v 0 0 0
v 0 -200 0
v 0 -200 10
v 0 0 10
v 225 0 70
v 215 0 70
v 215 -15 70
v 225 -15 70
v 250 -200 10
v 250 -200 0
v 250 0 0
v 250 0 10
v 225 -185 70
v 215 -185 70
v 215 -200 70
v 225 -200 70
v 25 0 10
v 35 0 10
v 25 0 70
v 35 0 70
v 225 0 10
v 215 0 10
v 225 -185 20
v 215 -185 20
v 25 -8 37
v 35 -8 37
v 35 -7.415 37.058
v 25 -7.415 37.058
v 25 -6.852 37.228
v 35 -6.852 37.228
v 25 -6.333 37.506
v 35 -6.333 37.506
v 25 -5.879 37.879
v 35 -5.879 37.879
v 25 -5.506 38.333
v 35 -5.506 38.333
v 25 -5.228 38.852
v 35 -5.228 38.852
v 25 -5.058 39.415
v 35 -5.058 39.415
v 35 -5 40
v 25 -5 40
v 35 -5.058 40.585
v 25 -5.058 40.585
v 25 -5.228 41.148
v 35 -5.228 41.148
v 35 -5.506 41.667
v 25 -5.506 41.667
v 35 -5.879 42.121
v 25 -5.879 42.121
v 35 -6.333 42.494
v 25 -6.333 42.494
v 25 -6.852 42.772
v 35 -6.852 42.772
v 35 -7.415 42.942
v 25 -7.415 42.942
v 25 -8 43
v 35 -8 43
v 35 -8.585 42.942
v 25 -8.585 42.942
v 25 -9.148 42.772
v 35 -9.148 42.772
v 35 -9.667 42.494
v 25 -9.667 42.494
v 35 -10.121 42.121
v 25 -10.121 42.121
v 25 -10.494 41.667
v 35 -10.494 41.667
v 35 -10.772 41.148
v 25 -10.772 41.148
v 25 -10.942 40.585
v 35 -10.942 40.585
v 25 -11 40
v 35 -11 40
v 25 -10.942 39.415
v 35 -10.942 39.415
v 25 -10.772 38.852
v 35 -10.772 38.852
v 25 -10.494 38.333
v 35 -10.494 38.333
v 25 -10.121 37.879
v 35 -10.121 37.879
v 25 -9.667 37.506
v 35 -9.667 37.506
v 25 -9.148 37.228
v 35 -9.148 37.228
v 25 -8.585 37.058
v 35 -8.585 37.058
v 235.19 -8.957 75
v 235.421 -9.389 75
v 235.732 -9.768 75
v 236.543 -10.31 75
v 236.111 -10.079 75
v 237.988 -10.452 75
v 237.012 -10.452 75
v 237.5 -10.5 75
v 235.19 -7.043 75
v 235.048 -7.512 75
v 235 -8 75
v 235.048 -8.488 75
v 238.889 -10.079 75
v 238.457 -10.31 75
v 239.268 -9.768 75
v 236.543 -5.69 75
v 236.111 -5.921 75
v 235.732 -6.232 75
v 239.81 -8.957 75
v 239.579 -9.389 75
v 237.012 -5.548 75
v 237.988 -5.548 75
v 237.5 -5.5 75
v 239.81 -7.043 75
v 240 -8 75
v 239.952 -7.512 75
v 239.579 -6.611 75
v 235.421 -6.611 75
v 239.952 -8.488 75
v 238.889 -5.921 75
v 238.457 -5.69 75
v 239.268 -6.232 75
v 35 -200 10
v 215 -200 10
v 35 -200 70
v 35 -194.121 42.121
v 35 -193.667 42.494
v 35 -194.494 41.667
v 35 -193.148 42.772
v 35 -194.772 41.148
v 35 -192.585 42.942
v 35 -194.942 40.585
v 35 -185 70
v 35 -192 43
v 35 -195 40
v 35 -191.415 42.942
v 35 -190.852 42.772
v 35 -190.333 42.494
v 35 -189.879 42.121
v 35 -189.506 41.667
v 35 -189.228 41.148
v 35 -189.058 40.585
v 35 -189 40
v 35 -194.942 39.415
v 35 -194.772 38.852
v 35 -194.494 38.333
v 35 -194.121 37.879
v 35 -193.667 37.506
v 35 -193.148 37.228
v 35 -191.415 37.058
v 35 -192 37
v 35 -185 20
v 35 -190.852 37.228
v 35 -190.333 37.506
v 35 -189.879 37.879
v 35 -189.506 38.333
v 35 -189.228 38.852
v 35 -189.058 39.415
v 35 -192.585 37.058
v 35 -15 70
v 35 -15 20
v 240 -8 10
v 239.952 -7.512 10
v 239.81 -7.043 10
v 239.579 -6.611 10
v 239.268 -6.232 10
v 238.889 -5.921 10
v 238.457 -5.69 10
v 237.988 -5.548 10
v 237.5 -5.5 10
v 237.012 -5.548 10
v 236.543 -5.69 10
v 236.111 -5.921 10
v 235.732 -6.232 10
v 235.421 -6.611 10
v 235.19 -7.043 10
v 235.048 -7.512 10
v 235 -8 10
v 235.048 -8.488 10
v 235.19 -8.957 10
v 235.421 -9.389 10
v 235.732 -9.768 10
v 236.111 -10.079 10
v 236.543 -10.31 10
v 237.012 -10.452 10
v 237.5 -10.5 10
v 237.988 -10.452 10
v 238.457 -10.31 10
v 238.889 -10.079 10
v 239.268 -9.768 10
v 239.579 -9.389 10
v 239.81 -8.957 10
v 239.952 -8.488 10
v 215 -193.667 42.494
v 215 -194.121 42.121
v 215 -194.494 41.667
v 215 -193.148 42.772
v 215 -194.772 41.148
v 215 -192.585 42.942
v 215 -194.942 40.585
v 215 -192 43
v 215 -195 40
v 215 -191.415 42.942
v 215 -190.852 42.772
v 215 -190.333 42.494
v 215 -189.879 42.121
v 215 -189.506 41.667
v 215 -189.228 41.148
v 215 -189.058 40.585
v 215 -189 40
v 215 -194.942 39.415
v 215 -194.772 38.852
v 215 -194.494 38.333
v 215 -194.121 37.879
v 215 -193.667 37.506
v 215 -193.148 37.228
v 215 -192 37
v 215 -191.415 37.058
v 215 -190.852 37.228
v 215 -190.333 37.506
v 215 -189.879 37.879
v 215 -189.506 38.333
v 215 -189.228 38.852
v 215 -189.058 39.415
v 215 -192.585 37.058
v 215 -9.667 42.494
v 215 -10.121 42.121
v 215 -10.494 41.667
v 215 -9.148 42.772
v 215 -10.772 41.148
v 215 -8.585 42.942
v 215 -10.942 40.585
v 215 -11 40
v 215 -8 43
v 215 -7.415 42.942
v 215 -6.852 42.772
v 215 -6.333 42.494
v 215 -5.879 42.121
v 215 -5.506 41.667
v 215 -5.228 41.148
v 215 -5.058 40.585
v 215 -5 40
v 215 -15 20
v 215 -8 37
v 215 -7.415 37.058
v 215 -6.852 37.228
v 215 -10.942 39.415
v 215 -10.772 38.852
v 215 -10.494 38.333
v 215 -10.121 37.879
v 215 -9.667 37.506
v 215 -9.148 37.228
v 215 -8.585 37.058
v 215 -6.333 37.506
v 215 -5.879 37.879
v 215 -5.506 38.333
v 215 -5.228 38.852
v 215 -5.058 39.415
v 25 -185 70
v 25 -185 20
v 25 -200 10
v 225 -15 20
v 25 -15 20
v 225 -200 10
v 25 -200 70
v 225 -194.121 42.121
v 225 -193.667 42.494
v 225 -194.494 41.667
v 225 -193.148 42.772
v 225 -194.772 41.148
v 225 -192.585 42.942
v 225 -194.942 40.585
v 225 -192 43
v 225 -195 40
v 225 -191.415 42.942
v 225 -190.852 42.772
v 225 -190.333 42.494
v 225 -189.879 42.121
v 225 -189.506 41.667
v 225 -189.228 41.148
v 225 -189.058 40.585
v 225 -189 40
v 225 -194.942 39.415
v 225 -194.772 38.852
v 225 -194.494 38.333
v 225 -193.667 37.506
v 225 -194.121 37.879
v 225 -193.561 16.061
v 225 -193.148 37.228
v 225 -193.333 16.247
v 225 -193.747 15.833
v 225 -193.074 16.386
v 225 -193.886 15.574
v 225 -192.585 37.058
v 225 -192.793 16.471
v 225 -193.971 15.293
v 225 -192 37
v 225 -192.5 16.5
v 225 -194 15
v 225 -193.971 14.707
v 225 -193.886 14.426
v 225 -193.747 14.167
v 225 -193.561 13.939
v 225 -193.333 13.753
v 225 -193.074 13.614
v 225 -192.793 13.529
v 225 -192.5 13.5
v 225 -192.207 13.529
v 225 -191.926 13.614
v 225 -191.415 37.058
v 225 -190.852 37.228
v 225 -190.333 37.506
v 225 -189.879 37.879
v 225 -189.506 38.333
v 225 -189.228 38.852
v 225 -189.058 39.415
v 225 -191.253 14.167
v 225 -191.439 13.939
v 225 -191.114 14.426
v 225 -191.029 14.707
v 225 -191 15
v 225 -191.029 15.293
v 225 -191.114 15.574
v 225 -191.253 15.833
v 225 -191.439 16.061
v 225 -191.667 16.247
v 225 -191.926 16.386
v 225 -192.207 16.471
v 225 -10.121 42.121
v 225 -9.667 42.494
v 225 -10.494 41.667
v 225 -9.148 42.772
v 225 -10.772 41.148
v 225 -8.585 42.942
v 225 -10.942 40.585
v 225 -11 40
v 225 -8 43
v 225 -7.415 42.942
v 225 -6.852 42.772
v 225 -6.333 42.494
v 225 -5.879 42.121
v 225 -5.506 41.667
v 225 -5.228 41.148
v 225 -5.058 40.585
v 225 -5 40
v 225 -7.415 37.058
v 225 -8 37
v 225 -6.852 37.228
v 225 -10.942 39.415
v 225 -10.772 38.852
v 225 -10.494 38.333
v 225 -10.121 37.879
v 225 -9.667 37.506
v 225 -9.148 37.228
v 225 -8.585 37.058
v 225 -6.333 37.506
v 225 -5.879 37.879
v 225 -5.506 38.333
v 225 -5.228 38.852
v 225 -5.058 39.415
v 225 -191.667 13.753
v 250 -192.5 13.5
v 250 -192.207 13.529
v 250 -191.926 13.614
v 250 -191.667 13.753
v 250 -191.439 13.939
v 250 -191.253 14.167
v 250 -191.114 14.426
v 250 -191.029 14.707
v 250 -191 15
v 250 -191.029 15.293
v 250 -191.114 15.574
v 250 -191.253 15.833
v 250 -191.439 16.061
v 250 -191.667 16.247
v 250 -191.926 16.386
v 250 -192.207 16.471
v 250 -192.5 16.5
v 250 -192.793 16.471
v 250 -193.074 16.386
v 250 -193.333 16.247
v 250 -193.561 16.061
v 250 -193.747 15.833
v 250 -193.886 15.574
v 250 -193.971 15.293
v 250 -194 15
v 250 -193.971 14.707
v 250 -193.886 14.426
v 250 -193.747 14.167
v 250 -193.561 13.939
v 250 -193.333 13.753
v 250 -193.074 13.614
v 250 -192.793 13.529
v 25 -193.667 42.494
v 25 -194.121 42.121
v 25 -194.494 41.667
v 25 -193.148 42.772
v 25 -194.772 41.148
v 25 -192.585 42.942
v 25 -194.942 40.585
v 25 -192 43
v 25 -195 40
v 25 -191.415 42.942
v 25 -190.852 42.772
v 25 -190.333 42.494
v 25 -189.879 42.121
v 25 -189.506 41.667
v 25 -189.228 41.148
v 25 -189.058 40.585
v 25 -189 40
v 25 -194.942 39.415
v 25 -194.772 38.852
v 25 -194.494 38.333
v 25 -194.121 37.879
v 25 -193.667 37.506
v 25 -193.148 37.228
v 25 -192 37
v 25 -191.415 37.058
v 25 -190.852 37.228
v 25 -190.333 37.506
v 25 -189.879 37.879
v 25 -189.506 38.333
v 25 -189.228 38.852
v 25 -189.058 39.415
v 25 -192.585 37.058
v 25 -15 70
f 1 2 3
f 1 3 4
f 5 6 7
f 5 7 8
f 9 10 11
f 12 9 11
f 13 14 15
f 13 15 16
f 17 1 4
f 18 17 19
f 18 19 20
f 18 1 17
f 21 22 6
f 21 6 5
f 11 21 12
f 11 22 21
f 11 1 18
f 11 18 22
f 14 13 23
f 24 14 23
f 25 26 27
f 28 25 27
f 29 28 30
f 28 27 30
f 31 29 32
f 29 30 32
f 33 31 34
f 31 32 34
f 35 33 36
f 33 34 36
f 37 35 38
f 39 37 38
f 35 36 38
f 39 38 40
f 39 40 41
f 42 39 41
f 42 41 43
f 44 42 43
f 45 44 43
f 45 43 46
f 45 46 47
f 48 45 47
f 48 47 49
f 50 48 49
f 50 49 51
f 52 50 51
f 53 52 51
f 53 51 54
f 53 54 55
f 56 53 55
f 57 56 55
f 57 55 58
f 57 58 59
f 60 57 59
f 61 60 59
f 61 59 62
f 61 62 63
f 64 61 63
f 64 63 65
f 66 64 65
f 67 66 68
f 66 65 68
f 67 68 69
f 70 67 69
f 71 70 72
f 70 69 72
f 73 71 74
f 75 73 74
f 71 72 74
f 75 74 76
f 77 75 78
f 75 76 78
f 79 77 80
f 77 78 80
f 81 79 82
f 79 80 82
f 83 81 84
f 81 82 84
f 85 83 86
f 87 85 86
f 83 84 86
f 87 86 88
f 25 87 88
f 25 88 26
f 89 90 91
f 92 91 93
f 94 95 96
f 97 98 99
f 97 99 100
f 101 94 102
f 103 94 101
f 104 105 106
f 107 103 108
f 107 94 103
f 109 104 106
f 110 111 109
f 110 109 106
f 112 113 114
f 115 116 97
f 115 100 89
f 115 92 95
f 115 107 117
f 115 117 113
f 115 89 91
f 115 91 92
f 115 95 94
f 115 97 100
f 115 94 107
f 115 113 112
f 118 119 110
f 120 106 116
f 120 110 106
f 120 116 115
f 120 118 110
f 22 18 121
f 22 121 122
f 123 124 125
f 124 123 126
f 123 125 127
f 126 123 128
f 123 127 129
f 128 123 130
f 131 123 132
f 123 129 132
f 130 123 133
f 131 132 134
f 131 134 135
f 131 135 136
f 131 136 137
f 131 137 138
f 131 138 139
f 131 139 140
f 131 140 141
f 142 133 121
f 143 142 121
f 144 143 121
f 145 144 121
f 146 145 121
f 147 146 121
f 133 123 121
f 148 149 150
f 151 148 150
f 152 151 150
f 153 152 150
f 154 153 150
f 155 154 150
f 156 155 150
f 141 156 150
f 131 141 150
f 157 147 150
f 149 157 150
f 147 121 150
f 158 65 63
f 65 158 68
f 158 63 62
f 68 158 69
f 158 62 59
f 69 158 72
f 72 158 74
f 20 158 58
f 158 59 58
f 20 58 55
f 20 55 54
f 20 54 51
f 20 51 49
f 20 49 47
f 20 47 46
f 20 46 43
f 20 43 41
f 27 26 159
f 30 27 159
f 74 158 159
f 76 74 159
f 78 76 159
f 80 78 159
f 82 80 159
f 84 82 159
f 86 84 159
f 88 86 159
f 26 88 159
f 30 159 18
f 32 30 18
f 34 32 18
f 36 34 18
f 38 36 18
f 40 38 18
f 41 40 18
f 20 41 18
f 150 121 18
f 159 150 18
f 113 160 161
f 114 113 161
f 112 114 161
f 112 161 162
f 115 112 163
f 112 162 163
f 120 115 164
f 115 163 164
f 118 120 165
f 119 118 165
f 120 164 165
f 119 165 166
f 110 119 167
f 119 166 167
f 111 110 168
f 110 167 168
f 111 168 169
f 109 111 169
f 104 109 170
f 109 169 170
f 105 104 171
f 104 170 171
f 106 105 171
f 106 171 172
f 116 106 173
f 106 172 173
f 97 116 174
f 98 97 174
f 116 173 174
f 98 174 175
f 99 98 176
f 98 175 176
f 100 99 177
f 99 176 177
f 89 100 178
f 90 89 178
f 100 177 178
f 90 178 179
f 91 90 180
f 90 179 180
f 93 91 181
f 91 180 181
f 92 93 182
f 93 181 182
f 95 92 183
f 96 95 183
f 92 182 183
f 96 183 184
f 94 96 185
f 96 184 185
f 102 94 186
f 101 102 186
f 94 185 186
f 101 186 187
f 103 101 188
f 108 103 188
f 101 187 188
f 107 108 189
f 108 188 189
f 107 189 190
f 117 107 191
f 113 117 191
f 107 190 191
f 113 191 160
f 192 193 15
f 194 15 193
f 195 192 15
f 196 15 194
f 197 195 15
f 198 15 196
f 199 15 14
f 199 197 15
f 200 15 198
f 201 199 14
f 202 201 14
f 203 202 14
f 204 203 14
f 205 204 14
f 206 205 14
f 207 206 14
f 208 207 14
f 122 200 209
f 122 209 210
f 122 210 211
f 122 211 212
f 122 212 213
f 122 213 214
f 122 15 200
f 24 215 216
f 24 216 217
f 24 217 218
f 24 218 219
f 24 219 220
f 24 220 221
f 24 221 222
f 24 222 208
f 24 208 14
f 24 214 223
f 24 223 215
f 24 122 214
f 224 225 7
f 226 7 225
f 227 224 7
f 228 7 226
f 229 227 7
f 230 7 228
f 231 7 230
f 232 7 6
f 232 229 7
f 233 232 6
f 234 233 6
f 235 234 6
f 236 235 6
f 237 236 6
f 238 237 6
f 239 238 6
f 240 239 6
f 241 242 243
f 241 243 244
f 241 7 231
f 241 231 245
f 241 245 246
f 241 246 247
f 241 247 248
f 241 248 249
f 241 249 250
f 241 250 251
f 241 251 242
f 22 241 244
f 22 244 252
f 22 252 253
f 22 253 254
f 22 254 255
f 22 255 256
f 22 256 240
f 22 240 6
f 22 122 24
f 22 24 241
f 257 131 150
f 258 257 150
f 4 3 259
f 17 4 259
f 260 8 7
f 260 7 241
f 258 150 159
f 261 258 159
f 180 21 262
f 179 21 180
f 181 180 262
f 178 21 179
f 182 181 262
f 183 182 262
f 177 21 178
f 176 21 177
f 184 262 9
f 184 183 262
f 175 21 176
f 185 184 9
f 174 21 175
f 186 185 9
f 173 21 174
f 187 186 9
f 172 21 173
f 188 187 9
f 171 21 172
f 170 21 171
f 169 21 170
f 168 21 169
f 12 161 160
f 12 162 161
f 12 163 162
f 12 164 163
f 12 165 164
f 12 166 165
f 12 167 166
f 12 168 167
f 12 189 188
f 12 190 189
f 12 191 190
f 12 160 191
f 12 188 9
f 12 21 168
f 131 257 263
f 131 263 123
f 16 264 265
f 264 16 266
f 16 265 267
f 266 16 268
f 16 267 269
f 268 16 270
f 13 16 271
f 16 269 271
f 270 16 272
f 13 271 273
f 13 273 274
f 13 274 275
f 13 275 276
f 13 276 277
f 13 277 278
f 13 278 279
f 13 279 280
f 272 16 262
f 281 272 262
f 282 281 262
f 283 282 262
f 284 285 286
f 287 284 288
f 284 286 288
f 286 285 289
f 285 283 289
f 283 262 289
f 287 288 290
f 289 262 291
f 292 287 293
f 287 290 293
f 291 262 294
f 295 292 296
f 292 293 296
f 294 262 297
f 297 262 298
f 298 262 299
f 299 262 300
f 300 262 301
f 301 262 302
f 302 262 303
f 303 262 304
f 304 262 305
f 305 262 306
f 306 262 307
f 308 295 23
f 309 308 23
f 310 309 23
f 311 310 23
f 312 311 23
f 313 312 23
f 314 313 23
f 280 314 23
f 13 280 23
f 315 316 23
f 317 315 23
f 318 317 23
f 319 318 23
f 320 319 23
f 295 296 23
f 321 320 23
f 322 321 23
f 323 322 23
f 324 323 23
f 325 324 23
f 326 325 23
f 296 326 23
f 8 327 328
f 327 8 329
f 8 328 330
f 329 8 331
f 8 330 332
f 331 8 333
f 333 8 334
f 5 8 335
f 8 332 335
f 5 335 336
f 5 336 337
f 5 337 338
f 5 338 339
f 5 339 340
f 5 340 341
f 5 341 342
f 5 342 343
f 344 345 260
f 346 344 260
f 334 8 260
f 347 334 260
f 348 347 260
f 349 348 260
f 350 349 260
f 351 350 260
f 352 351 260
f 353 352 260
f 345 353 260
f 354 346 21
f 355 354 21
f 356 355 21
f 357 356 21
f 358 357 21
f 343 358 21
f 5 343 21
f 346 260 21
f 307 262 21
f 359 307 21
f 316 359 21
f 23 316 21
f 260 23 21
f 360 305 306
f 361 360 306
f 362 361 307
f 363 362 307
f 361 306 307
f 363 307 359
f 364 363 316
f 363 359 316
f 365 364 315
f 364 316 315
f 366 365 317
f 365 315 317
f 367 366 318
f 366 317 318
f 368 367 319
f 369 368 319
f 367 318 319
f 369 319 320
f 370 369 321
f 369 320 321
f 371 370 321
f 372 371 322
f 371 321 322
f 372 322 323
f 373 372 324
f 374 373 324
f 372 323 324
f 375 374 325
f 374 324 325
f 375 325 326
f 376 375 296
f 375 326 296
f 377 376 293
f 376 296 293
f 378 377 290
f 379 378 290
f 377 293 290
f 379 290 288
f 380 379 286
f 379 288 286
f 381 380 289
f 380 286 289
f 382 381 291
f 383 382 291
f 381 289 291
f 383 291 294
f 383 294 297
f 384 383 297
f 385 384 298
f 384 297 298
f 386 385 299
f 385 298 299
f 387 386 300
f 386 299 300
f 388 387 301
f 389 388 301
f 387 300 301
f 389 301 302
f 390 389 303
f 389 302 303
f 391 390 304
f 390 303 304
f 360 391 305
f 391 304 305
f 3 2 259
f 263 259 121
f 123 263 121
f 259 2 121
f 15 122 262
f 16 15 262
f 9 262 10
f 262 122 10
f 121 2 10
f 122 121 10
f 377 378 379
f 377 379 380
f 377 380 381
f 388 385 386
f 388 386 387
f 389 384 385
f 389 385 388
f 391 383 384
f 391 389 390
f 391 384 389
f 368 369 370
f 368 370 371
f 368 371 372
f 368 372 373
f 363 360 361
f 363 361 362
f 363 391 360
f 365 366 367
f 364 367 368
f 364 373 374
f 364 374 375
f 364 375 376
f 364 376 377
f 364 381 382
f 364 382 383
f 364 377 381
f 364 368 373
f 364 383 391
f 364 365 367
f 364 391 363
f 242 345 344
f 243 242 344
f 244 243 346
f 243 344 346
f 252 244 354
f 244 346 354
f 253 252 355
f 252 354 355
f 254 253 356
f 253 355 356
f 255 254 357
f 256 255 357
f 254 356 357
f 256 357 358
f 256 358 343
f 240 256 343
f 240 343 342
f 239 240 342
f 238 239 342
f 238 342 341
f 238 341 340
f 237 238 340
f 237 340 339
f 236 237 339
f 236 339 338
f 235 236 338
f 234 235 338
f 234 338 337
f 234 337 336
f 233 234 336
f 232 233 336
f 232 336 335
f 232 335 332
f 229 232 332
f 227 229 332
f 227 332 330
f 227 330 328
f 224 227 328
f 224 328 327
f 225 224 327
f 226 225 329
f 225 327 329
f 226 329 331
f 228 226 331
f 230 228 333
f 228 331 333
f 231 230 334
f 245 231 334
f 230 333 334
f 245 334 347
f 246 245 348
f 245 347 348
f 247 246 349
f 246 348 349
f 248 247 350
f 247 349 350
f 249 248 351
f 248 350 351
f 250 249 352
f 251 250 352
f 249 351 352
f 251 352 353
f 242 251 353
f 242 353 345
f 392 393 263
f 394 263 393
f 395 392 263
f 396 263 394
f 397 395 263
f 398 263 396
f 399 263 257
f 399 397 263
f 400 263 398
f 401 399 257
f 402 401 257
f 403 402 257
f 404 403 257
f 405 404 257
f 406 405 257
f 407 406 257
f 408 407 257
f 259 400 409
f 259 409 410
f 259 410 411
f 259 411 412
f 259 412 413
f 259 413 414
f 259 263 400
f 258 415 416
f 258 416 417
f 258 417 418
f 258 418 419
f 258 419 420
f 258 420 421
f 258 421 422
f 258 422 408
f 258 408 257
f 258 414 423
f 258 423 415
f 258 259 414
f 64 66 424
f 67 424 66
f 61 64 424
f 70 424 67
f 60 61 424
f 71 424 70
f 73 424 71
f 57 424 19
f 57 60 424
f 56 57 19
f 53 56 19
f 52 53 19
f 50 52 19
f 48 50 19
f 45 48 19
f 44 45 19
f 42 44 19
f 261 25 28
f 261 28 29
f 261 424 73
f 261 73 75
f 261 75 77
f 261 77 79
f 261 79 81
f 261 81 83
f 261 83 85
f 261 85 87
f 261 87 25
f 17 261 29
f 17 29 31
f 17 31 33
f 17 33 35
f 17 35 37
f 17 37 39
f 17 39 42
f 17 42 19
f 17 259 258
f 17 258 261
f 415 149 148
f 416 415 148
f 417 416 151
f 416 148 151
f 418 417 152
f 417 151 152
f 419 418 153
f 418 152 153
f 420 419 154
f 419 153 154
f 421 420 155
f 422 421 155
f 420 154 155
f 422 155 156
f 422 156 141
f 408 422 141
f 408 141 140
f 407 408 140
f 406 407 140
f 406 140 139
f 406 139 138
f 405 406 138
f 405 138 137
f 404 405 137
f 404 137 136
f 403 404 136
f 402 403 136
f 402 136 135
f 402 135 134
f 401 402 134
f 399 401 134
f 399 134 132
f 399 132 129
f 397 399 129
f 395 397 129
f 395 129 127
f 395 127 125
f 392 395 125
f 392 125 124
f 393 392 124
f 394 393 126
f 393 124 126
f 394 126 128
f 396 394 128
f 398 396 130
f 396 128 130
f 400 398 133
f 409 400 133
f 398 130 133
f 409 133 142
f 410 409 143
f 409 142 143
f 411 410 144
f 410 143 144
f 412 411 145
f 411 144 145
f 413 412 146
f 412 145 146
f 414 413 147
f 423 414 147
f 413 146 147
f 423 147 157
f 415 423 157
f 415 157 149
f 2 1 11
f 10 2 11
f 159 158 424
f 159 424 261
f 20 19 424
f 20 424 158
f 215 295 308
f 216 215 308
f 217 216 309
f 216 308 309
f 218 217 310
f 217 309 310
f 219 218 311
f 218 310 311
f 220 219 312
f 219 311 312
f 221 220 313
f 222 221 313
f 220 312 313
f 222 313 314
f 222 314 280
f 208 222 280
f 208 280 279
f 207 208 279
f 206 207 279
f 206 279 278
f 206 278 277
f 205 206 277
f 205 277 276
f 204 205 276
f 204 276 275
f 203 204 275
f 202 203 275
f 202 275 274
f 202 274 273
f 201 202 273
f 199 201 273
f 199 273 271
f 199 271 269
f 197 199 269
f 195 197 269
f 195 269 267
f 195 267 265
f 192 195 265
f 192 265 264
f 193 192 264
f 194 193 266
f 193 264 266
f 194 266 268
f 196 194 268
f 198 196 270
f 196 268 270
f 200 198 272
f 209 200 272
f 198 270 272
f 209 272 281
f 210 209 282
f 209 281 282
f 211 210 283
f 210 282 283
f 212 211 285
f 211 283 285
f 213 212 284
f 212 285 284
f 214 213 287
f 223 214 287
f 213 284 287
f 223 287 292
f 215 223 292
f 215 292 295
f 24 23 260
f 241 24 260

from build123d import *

# Parameters (mm, degrees)
ESQUISSE1_W             = 250
ESQUISSE1_H             = 200
BOSS_EXTRU_1_DEPTH      = 10
ESQUISSE2_W             = 10
ESQUISSE2_H             = 200
BOSS_EXTRU_2_DEPTH      = 60
ESQUISSE3_R             = 3
ESQUISSE3_W             = 50
ESQUISSE3_H             = 170
ENL_V_MAT_EXTRU_1_DEPTH = 226
ESQUISSE4_R             = 2.5
BOSS_EXTRU_5_DEPTH      = 65
ESQUISSE8_R             = 1.5
BOSS_EXTRU_8_DEPTH      = 25


with BuildPart() as part:
    # Esquisse1 → Boss.-Extru.1 (new body)
    with BuildSketch(Plane.XY):
        with Locations((125, -100)):
            Rectangle(ESQUISSE1_W, ESQUISSE1_H)
    extrude(amount=BOSS_EXTRU_1_DEPTH)

    # Esquisse2 → Boss.-Extru.2 (add)
    with BuildSketch(Plane.XY.offset(10)):
        with Locations((30, -100)):
            Rectangle(ESQUISSE2_W, ESQUISSE2_H)
        with Locations((220, -100)):
            Rectangle(ESQUISSE2_W, ESQUISSE2_H)
    extrude(amount=BOSS_EXTRU_2_DEPTH)

    # Esquisse3 → Enlèv. mat.-Extru.1 (cut, through all)
    with BuildSketch(Plane(origin=(225, 0, 0), x_dir=(0, 0, -1), z_dir=(1, 0, 0))):
        with Locations((-40, -192)):
            Circle(ESQUISSE3_R)
        with Locations((-40, -8)):
            Circle(ESQUISSE3_R)
        with Locations((-45, -100)):
            Rectangle(ESQUISSE3_W, ESQUISSE3_H)
    extrude(amount=-ENL_V_MAT_EXTRU_1_DEPTH, mode=Mode.SUBTRACT)

    # Esquisse4 → Boss.-Extru.5 (add)
    with BuildSketch(Plane.XY.offset(10)):
        with Locations((237.5, -8)):
            Circle(ESQUISSE4_R)
    extrude(amount=BOSS_EXTRU_5_DEPTH)

    # Esquisse8 → Boss.-Extru.8 (add)
    with BuildSketch(Plane(origin=(225, 0, 0), x_dir=(0, 0, -1), z_dir=(1, 0, 0))):
        with Locations((-15, -192.5)):
            Circle(ESQUISSE8_R)
    extrude(amount=BOSS_EXTRU_8_DEPTH)


solid = part.part
